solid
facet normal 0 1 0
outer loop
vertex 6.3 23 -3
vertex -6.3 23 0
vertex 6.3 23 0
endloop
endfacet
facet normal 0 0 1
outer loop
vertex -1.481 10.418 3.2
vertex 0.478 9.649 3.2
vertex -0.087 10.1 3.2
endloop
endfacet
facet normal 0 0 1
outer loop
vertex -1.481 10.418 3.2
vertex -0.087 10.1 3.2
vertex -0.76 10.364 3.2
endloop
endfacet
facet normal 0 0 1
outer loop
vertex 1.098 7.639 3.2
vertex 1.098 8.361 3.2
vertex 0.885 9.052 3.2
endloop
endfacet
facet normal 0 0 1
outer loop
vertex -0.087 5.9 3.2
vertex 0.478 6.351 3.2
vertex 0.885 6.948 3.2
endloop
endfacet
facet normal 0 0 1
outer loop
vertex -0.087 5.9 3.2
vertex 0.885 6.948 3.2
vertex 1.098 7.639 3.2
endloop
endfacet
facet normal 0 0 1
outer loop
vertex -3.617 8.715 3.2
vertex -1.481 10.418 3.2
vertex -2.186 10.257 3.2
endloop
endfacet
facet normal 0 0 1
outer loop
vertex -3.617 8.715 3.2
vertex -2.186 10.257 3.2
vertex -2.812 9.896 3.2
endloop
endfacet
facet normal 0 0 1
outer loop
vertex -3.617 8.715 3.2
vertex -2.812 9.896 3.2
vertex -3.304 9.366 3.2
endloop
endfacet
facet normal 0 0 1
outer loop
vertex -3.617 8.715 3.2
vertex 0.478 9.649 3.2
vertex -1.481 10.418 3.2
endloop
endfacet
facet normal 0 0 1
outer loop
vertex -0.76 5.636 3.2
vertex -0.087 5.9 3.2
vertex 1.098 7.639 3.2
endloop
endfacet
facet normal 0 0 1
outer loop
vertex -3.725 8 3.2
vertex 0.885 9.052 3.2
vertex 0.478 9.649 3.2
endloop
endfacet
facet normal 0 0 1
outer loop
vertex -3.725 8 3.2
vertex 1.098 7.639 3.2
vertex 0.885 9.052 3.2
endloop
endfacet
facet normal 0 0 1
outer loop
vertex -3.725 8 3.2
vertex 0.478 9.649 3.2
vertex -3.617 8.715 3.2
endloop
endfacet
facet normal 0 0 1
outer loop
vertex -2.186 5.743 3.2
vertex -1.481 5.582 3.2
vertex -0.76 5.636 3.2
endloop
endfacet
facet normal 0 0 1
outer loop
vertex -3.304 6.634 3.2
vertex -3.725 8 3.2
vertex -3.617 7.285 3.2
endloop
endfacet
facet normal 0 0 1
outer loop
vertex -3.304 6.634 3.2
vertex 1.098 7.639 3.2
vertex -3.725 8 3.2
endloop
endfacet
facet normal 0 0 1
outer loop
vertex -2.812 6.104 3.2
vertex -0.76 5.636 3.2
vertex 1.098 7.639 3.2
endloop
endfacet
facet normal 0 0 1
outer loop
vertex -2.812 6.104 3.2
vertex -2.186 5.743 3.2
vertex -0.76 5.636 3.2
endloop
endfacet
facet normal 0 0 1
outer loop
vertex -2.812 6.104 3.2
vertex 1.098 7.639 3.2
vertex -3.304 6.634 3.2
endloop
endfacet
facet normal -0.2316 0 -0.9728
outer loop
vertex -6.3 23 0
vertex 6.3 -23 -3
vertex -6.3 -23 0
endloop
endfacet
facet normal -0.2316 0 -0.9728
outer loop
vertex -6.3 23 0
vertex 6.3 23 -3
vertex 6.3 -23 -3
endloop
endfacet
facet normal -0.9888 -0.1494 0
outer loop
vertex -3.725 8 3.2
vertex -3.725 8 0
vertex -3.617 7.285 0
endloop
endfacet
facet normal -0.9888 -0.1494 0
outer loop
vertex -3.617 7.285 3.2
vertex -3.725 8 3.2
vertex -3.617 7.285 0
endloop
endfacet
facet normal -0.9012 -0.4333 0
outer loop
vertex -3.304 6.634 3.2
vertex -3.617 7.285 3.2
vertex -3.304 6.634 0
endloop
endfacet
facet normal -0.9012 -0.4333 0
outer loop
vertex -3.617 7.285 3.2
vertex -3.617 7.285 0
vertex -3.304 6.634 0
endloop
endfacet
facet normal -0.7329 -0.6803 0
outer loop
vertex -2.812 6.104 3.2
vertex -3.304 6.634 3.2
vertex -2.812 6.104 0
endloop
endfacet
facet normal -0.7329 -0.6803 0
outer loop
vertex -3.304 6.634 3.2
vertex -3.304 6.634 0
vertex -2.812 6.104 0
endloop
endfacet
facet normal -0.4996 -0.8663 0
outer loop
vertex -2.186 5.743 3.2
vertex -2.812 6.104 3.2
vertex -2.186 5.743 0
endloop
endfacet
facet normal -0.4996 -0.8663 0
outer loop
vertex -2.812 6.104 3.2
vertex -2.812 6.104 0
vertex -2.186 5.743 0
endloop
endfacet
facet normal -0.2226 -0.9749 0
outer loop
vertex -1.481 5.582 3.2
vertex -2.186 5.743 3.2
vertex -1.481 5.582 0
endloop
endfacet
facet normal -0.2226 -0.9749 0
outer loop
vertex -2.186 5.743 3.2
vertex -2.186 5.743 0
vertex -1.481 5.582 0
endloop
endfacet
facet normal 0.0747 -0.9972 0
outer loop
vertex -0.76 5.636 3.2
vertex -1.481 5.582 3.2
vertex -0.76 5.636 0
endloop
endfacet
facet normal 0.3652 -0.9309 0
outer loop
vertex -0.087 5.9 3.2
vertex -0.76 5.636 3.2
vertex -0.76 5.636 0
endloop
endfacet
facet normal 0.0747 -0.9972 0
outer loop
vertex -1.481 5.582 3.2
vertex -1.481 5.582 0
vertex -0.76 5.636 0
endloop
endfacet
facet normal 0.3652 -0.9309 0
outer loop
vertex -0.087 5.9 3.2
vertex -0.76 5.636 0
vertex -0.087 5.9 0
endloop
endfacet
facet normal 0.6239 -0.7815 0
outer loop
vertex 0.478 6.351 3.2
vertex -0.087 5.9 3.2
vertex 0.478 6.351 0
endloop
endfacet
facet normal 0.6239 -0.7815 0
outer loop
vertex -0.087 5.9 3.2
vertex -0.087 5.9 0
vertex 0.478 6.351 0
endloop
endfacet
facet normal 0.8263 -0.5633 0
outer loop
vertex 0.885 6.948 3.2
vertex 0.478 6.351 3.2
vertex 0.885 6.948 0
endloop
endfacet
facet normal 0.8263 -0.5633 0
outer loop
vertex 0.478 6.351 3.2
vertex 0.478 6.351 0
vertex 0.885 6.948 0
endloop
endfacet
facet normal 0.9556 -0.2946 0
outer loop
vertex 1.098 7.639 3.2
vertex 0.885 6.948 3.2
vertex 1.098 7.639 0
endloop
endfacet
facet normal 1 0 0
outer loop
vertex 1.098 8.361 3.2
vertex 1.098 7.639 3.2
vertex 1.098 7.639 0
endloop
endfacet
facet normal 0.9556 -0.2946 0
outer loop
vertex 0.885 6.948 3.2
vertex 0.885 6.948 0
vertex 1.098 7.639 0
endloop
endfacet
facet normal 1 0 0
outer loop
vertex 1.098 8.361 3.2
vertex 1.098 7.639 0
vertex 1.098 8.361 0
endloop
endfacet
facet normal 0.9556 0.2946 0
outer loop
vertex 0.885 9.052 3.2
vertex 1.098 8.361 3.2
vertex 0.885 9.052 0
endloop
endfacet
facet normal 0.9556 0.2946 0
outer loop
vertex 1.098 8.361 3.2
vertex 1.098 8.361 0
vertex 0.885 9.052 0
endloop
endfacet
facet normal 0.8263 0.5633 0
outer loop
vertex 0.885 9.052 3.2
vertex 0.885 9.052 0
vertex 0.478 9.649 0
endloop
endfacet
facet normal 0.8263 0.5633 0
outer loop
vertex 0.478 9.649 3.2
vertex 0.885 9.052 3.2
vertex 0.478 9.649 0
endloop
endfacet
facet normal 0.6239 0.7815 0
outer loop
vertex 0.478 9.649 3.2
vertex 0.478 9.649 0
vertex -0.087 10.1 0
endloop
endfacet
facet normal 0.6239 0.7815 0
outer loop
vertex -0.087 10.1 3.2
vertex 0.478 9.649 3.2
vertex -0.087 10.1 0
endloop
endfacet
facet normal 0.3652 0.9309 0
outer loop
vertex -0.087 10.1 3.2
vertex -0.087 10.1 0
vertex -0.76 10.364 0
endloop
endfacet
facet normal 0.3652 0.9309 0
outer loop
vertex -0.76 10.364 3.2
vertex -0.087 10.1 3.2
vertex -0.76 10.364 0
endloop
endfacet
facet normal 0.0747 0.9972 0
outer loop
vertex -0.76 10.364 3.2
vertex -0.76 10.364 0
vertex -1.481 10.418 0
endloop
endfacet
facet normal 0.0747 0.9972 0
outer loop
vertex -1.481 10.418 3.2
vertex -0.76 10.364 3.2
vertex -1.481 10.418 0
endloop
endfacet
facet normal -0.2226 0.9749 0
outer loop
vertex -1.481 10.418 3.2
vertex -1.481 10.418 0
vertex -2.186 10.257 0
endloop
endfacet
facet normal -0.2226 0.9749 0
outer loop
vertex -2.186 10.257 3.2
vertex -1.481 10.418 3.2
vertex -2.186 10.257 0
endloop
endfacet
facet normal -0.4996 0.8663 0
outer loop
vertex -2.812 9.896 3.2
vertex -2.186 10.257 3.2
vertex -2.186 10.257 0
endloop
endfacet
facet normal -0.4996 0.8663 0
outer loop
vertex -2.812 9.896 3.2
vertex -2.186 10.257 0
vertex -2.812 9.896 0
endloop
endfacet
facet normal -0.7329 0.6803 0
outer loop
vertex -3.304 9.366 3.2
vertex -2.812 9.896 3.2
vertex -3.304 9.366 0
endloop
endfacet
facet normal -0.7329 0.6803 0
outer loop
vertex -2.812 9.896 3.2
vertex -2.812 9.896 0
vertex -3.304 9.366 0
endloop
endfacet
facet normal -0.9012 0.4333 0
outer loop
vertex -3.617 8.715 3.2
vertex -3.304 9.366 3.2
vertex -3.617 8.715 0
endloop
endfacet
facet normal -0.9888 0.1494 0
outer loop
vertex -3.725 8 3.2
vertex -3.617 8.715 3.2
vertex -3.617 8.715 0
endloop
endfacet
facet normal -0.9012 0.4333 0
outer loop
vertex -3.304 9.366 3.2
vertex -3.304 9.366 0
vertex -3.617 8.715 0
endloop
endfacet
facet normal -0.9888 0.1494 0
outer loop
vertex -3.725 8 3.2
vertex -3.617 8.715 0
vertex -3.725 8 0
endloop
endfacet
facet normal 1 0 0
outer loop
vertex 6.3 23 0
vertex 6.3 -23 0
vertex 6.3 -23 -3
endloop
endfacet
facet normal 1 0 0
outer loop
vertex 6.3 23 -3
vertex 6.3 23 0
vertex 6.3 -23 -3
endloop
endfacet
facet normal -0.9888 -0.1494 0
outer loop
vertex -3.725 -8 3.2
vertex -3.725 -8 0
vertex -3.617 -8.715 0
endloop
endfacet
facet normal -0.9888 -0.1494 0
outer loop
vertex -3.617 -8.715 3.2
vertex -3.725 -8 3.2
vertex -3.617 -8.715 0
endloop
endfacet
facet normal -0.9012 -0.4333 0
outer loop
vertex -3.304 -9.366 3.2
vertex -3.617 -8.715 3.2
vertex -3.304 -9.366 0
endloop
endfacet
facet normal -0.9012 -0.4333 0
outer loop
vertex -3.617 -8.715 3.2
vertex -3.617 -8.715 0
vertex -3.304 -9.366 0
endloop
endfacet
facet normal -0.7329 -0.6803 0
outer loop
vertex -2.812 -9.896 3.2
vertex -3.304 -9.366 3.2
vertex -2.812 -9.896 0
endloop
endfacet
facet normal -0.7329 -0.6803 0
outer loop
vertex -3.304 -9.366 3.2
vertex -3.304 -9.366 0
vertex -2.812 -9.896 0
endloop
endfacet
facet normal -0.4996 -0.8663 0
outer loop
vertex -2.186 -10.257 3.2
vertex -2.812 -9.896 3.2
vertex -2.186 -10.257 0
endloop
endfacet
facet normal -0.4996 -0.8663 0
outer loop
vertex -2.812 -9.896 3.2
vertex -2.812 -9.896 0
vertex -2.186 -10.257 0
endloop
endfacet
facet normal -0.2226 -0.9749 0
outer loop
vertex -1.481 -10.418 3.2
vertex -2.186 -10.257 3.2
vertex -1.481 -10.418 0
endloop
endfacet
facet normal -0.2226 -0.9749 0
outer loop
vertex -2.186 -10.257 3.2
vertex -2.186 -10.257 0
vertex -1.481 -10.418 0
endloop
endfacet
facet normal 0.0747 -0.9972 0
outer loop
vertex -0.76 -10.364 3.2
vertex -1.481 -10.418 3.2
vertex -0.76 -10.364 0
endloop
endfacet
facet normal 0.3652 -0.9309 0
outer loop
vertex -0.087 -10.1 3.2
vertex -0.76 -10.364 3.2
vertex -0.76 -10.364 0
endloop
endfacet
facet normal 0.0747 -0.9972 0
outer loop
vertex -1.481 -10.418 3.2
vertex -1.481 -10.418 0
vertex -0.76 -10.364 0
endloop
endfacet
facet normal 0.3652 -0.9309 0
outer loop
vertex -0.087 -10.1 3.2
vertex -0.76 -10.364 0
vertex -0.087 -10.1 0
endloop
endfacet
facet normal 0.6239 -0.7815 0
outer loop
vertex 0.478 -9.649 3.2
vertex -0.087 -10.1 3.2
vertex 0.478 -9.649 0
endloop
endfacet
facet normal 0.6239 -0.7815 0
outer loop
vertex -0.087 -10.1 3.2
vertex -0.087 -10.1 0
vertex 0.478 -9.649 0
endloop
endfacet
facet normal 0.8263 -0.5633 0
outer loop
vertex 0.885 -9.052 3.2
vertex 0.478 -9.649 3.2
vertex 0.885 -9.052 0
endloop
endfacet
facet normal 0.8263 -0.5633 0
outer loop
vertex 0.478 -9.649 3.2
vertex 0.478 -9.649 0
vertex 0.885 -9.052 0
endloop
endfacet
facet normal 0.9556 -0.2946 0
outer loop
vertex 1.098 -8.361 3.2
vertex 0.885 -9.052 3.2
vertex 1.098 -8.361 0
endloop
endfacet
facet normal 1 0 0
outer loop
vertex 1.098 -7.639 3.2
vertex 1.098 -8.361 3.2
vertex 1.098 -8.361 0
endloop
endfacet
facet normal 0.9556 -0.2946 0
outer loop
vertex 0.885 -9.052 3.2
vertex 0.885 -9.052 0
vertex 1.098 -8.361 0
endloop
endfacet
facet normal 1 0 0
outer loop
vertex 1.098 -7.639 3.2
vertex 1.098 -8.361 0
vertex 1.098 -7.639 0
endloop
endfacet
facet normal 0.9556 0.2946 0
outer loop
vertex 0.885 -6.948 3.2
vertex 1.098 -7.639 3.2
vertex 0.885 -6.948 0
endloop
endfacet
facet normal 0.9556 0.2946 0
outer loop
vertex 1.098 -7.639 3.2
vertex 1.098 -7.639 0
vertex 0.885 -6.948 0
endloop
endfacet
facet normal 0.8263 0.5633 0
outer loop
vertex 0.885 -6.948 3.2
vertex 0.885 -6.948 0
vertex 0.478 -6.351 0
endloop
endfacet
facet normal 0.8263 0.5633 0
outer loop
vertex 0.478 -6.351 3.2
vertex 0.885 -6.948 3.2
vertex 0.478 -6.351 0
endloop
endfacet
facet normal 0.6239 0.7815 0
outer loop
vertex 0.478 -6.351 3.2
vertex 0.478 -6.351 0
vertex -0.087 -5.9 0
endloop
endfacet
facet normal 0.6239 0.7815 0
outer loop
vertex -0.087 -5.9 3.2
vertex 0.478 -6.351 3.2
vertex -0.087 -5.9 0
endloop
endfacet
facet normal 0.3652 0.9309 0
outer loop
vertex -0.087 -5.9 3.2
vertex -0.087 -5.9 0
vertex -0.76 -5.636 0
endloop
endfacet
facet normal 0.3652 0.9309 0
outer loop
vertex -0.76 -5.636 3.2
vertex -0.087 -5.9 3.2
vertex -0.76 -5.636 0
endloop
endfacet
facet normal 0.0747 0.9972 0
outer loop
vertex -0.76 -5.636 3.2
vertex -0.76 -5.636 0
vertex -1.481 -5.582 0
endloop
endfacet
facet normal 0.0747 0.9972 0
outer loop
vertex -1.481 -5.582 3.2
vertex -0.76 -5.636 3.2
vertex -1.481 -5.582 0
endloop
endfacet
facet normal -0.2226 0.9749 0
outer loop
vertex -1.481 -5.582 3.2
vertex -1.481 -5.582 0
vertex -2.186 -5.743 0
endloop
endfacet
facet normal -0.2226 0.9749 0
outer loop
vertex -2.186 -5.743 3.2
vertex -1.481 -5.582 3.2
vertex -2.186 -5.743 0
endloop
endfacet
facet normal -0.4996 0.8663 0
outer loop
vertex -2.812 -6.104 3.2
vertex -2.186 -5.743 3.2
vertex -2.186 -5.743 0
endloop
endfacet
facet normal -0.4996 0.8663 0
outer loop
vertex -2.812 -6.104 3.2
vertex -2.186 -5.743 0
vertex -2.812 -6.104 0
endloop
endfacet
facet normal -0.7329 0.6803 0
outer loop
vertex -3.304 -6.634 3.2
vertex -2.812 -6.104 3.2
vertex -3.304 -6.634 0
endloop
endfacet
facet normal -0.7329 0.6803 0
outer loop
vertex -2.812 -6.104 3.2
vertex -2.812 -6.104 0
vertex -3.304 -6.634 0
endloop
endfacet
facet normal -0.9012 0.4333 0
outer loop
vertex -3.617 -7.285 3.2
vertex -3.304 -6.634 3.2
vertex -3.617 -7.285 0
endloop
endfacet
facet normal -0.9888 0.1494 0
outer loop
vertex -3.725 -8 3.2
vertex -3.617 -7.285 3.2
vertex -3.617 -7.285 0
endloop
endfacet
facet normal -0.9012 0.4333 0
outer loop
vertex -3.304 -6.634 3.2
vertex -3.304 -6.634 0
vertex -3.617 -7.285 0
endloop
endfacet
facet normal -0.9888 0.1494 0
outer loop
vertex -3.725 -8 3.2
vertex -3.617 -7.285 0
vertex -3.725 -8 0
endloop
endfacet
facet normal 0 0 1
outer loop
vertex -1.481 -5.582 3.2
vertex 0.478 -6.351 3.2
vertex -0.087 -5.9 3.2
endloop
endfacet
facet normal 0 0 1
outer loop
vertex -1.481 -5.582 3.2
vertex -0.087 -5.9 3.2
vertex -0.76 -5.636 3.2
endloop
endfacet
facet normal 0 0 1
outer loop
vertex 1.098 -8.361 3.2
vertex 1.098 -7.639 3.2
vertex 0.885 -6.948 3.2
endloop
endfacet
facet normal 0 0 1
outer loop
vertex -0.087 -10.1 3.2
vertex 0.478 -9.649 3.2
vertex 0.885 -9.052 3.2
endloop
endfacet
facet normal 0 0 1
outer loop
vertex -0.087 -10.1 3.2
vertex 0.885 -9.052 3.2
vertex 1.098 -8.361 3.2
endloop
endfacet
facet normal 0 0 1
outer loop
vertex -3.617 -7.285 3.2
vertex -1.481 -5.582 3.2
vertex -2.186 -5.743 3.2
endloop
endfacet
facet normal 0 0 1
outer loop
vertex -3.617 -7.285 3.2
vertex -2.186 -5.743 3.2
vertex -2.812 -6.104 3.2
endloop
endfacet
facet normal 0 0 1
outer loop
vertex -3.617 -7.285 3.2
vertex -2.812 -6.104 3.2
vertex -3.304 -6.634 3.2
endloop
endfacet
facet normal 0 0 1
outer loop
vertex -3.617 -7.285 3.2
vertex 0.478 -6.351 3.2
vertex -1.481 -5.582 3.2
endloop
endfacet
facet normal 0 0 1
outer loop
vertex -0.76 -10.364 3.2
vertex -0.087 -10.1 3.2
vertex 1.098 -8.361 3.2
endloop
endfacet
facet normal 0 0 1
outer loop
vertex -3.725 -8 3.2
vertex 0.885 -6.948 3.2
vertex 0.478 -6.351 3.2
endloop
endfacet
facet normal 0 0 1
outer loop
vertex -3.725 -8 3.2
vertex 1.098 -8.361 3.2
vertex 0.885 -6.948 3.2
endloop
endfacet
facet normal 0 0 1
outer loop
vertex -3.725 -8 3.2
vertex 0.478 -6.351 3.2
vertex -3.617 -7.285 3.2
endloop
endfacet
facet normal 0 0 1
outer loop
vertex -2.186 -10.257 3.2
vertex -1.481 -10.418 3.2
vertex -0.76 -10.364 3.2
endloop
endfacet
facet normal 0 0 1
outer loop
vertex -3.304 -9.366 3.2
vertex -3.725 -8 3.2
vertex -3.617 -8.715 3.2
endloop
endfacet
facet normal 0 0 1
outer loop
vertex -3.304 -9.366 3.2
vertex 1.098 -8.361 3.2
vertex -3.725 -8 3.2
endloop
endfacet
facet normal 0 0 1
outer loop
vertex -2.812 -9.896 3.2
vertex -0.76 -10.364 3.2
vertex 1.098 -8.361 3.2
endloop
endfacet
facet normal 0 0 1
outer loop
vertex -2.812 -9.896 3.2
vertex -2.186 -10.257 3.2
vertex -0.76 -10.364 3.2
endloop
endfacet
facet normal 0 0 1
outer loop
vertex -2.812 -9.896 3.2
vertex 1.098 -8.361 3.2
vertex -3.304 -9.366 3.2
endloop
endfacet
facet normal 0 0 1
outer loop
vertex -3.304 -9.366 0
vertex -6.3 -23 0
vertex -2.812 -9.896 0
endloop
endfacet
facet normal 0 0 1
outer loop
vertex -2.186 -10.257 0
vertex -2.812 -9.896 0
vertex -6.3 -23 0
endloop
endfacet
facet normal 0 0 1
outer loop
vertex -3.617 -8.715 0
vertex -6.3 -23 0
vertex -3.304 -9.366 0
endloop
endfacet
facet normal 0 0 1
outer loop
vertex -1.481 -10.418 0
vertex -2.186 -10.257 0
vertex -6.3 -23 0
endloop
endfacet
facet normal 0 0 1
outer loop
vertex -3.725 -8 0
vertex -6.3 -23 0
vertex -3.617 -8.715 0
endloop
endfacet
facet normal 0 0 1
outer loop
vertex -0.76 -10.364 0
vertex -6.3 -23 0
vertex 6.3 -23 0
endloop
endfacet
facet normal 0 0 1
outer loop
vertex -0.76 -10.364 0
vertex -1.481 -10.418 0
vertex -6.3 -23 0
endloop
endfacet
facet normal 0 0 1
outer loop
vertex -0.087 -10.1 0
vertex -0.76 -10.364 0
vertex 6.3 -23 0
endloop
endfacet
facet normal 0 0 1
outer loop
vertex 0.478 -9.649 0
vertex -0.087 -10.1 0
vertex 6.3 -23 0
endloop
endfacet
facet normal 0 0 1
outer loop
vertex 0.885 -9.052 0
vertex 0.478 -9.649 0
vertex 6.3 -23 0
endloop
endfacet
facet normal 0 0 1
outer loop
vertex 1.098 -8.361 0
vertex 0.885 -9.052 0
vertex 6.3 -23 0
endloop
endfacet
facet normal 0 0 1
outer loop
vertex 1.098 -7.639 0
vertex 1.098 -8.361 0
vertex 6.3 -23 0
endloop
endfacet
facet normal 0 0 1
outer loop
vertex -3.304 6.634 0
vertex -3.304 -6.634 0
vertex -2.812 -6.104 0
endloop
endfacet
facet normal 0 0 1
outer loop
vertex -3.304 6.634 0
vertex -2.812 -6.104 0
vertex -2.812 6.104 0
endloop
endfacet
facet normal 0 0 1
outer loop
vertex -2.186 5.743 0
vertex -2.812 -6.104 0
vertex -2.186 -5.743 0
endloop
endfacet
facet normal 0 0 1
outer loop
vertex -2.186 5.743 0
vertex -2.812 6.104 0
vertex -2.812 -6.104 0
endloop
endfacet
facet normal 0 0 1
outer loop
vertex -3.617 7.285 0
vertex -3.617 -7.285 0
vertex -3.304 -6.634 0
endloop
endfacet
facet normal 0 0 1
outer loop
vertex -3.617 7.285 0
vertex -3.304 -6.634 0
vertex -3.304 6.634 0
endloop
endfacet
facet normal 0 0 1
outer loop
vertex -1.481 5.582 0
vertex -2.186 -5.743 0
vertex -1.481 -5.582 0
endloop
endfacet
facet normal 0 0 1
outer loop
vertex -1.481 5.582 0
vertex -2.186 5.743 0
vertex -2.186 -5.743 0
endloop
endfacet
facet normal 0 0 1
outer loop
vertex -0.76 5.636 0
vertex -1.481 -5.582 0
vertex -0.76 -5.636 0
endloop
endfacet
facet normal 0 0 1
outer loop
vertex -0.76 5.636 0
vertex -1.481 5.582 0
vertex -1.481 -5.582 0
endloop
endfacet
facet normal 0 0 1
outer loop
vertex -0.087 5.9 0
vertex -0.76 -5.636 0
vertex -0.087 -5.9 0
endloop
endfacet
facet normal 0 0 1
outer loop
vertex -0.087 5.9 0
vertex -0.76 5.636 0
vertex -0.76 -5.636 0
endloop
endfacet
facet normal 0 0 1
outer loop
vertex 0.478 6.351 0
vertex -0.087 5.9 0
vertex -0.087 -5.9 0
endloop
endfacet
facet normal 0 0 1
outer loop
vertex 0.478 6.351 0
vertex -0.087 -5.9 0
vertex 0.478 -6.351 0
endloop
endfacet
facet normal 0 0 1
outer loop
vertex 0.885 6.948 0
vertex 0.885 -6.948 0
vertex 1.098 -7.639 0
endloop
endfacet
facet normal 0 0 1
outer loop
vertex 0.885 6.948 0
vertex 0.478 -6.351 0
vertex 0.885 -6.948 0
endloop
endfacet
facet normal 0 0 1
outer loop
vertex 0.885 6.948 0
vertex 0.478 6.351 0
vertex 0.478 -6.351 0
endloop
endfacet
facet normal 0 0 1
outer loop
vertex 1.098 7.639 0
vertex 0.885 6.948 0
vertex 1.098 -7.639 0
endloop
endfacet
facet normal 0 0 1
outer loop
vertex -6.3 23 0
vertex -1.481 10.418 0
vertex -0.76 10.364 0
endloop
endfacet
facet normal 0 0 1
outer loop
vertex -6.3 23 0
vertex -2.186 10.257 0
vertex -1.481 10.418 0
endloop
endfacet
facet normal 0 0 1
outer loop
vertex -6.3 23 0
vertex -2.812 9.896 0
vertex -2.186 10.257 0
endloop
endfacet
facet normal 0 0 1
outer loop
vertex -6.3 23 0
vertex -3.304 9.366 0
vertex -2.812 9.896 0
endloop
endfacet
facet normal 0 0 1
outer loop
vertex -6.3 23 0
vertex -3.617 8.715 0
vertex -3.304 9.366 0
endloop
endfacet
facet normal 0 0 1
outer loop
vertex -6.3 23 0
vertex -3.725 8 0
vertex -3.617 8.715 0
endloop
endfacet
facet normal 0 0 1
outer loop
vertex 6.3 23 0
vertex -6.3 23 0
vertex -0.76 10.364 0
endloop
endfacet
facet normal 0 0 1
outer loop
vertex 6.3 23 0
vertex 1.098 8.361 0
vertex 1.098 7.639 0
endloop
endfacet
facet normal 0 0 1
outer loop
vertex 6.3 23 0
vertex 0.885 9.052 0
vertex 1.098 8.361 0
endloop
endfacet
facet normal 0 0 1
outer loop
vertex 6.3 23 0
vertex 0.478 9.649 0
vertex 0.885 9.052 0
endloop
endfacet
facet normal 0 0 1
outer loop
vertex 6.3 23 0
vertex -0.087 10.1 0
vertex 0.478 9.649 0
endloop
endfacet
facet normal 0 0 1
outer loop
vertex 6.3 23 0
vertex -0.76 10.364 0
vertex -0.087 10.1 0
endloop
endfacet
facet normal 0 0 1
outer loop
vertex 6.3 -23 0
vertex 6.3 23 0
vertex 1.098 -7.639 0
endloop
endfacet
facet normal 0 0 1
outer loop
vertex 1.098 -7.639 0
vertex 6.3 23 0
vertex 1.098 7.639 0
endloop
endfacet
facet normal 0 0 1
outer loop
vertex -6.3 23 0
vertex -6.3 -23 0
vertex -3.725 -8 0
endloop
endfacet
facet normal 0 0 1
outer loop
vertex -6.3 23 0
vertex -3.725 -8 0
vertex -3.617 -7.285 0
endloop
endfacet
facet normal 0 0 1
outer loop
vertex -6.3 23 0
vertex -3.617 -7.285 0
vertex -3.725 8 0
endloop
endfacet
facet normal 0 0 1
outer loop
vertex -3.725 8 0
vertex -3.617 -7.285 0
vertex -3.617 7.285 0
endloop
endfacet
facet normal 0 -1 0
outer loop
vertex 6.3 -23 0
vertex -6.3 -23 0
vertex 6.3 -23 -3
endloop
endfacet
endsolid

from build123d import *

# Parameters (mm, degrees)
BOSS_EXTRUDE1_DEPTH = 23
SKETCH2_R           = 2.425
BOSS_EXTRUDE2_DEPTH = 3.2


with BuildPart() as part:
    # Sketch1 → Boss-Extrude1 (new, symmetric)
    with BuildSketch(Plane(origin=(0, 0, 0), x_dir=(1, 0, 0), z_dir=(0, 1, 0))):
        Polygon((-6.3, 0), (6.3, 0), (6.3, 3), align=None)
    extrude(amount=BOSS_EXTRUDE1_DEPTH, both=True)

    # Sketch2 → Boss-Extrude2 (add)
    with BuildSketch(Plane.XY):
        with Locations(Location((-1.3, 8, 0), (0, 0, 180))):
            Circle(SKETCH2_R)
        with Locations(Location((-1.3, -8, 0), (0, 0, 180))):
            Circle(SKETCH2_R)
    extrude(amount=BOSS_EXTRUDE2_DEPTH)


solid = part.part
